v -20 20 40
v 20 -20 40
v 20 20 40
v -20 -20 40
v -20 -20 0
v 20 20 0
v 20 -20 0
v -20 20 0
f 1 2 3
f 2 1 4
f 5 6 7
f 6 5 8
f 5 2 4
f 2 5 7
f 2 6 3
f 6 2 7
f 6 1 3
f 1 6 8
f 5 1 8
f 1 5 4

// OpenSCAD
// M+ 3D – romfigurer (kube, rektangulært prisme, pyramide, trekantprisme,
// sylinder, kjegle).
//
// Alle mål kommer fra den felles geometrimodellen i PHP (app/services/Solid*.php)
// som -D-variabler. Fila regner ikke ut mål selv: den bygger figuren og
// eventuelt hulrommet av tallene den får.
//
// Figuren står på byggeplaten (z = 0), midt over origo, med skarpe kanter.

shape = 1;          // 1 rett firkantet prisme (også kube), 2 firkantet pyramide,
                    // 3 trekantet prisme, 4 sylinder, 5 kjegle
sx = 40;            // ytre mål: x (lengde / diameter / grunnside)
sy = 40;            // ytre mål: y (bredde / grunnlinje i trekanten)
sz = 40;            // ytre mål: z (høyde)

hollow = 0;         // 1 = hul figur med lukket hulrom
wall = 2;           // veggtykkelse (gulvet ligger i z = wall)
c_x = 0;            // prisme: indre lengde
c_y = 0;            // prisme: indre bredde
c_top = 0;          // høyeste punkt i hulrommet (møne / topp)
c_half = 0;         // pyramide, trekantprisme, kjegle: halv bredde / radius ved gulvet
c_len = 0;          // trekantprisme: indre lengde
c_r = 0;            // sylinder: indre radius
ridge_x = 0;        // prisme: lengden av mønet i x-retning (0 = punkt)
ridge_y = 0;        // prisme: lengden av mønet i y-retning

segments = 128;     // sider i mangekanten for sylinder og kjegle

PYR_FACES = [[0, 1, 2, 3], [0, 4, 1], [1, 4, 2], [2, 4, 3], [3, 4, 0]];

module pyramid(half, z0, z1) {
    polyhedron(
        points = [[-half, -half, z0], [half, -half, z0], [half, half, z0], [-half, half, z0], [0, 0, z1]],
        faces = PYR_FACES);
}

// Trekant i yz-planet (grunnlinje 2·half ved z0, spiss i z1), langs x.
module tri_prism(len, half, z0, z1) {
    rotate([90, 0, 90]) linear_extrude(height = len, center = true)
        polygon([[-half, z0], [half, z0], [0, z1]]);
}

module outer() {
    if (shape == 1)      translate([-sx / 2, -sy / 2, 0]) cube([sx, sy, sz]);
    else if (shape == 2) pyramid(sx / 2, 0, sz);
    else if (shape == 3) tri_prism(sx, sy / 2, 0, sz);
    else if (shape == 4) cylinder(h = sz, d = sx, $fn = segments);
    else if (shape == 5) cylinder(h = sz, d1 = sx, d2 = 0, $fn = segments);
}

// Saltak langs x (snitt i xz-planet), mønet i c_top. Sider på 45°.
module gable_x(half_ridge, depth) {
    X = c_x / 2 + 1;
    low = wall - 1;
    top = half_ridge > 0.001
        ? [[-half_ridge, c_top], [half_ridge, c_top]]
        : [[0, c_top]];
    rotate([90, 0, 0]) linear_extrude(height = depth, center = true)
        polygon(concat([[-X, c_top - (X - half_ridge)]], top, [[X, c_top - (X - half_ridge)], [X, low], [-X, low]]));
}

// Samme langs y.
module gable_y(half_ridge, depth) {
    Y = c_y / 2 + 1;
    low = wall - 1;
    top = half_ridge > 0.001
        ? [[-half_ridge, c_top], [half_ridge, c_top]]
        : [[0, c_top]];
    rotate([90, 0, 90]) linear_extrude(height = depth, center = true)
        polygon(concat([[-Y, c_top - (Y - half_ridge)]], top, [[Y, c_top - (Y - half_ridge)], [Y, low], [-Y, low]]));
}

module cavity() {
    if (shape == 1) {
        // Indre boks med valmtak: skjæringen av to saltak på 45°.
        intersection() {
            translate([-c_x / 2, -c_y / 2, wall]) cube([c_x, c_y, c_top - wall + 1]);
            gable_x(ridge_x / 2, c_y + 2);
            gable_y(ridge_y / 2, c_x + 2);
        }
    } else if (shape == 2) {
        pyramid(c_half, wall, c_top);
    } else if (shape == 3) {
        tri_prism(c_len, c_half, wall, c_top);
    } else if (shape == 4) {
        // Indre sylinder med kjegleformet tak (45°), toppen i c_top. Bygd som
        // ett omdreiningslegeme (ingen skjæring, så ingen tynne restflater).
        k = c_top - wall;
        rotate_extrude($fn = segments)
            polygon(k > c_r
                ? [[0, wall], [c_r, wall], [c_r, c_top - c_r], [0, c_top]]
                : [[0, wall], [k, wall], [0, c_top]]);
    } else if (shape == 5) {
        translate([0, 0, wall]) cylinder(h = c_top - wall, r1 = c_half, r2 = 0, $fn = segments);
    }
}

if (hollow == 1) {
    difference() {
        outer();
        cavity();
    }
} else {
    outer();
}
